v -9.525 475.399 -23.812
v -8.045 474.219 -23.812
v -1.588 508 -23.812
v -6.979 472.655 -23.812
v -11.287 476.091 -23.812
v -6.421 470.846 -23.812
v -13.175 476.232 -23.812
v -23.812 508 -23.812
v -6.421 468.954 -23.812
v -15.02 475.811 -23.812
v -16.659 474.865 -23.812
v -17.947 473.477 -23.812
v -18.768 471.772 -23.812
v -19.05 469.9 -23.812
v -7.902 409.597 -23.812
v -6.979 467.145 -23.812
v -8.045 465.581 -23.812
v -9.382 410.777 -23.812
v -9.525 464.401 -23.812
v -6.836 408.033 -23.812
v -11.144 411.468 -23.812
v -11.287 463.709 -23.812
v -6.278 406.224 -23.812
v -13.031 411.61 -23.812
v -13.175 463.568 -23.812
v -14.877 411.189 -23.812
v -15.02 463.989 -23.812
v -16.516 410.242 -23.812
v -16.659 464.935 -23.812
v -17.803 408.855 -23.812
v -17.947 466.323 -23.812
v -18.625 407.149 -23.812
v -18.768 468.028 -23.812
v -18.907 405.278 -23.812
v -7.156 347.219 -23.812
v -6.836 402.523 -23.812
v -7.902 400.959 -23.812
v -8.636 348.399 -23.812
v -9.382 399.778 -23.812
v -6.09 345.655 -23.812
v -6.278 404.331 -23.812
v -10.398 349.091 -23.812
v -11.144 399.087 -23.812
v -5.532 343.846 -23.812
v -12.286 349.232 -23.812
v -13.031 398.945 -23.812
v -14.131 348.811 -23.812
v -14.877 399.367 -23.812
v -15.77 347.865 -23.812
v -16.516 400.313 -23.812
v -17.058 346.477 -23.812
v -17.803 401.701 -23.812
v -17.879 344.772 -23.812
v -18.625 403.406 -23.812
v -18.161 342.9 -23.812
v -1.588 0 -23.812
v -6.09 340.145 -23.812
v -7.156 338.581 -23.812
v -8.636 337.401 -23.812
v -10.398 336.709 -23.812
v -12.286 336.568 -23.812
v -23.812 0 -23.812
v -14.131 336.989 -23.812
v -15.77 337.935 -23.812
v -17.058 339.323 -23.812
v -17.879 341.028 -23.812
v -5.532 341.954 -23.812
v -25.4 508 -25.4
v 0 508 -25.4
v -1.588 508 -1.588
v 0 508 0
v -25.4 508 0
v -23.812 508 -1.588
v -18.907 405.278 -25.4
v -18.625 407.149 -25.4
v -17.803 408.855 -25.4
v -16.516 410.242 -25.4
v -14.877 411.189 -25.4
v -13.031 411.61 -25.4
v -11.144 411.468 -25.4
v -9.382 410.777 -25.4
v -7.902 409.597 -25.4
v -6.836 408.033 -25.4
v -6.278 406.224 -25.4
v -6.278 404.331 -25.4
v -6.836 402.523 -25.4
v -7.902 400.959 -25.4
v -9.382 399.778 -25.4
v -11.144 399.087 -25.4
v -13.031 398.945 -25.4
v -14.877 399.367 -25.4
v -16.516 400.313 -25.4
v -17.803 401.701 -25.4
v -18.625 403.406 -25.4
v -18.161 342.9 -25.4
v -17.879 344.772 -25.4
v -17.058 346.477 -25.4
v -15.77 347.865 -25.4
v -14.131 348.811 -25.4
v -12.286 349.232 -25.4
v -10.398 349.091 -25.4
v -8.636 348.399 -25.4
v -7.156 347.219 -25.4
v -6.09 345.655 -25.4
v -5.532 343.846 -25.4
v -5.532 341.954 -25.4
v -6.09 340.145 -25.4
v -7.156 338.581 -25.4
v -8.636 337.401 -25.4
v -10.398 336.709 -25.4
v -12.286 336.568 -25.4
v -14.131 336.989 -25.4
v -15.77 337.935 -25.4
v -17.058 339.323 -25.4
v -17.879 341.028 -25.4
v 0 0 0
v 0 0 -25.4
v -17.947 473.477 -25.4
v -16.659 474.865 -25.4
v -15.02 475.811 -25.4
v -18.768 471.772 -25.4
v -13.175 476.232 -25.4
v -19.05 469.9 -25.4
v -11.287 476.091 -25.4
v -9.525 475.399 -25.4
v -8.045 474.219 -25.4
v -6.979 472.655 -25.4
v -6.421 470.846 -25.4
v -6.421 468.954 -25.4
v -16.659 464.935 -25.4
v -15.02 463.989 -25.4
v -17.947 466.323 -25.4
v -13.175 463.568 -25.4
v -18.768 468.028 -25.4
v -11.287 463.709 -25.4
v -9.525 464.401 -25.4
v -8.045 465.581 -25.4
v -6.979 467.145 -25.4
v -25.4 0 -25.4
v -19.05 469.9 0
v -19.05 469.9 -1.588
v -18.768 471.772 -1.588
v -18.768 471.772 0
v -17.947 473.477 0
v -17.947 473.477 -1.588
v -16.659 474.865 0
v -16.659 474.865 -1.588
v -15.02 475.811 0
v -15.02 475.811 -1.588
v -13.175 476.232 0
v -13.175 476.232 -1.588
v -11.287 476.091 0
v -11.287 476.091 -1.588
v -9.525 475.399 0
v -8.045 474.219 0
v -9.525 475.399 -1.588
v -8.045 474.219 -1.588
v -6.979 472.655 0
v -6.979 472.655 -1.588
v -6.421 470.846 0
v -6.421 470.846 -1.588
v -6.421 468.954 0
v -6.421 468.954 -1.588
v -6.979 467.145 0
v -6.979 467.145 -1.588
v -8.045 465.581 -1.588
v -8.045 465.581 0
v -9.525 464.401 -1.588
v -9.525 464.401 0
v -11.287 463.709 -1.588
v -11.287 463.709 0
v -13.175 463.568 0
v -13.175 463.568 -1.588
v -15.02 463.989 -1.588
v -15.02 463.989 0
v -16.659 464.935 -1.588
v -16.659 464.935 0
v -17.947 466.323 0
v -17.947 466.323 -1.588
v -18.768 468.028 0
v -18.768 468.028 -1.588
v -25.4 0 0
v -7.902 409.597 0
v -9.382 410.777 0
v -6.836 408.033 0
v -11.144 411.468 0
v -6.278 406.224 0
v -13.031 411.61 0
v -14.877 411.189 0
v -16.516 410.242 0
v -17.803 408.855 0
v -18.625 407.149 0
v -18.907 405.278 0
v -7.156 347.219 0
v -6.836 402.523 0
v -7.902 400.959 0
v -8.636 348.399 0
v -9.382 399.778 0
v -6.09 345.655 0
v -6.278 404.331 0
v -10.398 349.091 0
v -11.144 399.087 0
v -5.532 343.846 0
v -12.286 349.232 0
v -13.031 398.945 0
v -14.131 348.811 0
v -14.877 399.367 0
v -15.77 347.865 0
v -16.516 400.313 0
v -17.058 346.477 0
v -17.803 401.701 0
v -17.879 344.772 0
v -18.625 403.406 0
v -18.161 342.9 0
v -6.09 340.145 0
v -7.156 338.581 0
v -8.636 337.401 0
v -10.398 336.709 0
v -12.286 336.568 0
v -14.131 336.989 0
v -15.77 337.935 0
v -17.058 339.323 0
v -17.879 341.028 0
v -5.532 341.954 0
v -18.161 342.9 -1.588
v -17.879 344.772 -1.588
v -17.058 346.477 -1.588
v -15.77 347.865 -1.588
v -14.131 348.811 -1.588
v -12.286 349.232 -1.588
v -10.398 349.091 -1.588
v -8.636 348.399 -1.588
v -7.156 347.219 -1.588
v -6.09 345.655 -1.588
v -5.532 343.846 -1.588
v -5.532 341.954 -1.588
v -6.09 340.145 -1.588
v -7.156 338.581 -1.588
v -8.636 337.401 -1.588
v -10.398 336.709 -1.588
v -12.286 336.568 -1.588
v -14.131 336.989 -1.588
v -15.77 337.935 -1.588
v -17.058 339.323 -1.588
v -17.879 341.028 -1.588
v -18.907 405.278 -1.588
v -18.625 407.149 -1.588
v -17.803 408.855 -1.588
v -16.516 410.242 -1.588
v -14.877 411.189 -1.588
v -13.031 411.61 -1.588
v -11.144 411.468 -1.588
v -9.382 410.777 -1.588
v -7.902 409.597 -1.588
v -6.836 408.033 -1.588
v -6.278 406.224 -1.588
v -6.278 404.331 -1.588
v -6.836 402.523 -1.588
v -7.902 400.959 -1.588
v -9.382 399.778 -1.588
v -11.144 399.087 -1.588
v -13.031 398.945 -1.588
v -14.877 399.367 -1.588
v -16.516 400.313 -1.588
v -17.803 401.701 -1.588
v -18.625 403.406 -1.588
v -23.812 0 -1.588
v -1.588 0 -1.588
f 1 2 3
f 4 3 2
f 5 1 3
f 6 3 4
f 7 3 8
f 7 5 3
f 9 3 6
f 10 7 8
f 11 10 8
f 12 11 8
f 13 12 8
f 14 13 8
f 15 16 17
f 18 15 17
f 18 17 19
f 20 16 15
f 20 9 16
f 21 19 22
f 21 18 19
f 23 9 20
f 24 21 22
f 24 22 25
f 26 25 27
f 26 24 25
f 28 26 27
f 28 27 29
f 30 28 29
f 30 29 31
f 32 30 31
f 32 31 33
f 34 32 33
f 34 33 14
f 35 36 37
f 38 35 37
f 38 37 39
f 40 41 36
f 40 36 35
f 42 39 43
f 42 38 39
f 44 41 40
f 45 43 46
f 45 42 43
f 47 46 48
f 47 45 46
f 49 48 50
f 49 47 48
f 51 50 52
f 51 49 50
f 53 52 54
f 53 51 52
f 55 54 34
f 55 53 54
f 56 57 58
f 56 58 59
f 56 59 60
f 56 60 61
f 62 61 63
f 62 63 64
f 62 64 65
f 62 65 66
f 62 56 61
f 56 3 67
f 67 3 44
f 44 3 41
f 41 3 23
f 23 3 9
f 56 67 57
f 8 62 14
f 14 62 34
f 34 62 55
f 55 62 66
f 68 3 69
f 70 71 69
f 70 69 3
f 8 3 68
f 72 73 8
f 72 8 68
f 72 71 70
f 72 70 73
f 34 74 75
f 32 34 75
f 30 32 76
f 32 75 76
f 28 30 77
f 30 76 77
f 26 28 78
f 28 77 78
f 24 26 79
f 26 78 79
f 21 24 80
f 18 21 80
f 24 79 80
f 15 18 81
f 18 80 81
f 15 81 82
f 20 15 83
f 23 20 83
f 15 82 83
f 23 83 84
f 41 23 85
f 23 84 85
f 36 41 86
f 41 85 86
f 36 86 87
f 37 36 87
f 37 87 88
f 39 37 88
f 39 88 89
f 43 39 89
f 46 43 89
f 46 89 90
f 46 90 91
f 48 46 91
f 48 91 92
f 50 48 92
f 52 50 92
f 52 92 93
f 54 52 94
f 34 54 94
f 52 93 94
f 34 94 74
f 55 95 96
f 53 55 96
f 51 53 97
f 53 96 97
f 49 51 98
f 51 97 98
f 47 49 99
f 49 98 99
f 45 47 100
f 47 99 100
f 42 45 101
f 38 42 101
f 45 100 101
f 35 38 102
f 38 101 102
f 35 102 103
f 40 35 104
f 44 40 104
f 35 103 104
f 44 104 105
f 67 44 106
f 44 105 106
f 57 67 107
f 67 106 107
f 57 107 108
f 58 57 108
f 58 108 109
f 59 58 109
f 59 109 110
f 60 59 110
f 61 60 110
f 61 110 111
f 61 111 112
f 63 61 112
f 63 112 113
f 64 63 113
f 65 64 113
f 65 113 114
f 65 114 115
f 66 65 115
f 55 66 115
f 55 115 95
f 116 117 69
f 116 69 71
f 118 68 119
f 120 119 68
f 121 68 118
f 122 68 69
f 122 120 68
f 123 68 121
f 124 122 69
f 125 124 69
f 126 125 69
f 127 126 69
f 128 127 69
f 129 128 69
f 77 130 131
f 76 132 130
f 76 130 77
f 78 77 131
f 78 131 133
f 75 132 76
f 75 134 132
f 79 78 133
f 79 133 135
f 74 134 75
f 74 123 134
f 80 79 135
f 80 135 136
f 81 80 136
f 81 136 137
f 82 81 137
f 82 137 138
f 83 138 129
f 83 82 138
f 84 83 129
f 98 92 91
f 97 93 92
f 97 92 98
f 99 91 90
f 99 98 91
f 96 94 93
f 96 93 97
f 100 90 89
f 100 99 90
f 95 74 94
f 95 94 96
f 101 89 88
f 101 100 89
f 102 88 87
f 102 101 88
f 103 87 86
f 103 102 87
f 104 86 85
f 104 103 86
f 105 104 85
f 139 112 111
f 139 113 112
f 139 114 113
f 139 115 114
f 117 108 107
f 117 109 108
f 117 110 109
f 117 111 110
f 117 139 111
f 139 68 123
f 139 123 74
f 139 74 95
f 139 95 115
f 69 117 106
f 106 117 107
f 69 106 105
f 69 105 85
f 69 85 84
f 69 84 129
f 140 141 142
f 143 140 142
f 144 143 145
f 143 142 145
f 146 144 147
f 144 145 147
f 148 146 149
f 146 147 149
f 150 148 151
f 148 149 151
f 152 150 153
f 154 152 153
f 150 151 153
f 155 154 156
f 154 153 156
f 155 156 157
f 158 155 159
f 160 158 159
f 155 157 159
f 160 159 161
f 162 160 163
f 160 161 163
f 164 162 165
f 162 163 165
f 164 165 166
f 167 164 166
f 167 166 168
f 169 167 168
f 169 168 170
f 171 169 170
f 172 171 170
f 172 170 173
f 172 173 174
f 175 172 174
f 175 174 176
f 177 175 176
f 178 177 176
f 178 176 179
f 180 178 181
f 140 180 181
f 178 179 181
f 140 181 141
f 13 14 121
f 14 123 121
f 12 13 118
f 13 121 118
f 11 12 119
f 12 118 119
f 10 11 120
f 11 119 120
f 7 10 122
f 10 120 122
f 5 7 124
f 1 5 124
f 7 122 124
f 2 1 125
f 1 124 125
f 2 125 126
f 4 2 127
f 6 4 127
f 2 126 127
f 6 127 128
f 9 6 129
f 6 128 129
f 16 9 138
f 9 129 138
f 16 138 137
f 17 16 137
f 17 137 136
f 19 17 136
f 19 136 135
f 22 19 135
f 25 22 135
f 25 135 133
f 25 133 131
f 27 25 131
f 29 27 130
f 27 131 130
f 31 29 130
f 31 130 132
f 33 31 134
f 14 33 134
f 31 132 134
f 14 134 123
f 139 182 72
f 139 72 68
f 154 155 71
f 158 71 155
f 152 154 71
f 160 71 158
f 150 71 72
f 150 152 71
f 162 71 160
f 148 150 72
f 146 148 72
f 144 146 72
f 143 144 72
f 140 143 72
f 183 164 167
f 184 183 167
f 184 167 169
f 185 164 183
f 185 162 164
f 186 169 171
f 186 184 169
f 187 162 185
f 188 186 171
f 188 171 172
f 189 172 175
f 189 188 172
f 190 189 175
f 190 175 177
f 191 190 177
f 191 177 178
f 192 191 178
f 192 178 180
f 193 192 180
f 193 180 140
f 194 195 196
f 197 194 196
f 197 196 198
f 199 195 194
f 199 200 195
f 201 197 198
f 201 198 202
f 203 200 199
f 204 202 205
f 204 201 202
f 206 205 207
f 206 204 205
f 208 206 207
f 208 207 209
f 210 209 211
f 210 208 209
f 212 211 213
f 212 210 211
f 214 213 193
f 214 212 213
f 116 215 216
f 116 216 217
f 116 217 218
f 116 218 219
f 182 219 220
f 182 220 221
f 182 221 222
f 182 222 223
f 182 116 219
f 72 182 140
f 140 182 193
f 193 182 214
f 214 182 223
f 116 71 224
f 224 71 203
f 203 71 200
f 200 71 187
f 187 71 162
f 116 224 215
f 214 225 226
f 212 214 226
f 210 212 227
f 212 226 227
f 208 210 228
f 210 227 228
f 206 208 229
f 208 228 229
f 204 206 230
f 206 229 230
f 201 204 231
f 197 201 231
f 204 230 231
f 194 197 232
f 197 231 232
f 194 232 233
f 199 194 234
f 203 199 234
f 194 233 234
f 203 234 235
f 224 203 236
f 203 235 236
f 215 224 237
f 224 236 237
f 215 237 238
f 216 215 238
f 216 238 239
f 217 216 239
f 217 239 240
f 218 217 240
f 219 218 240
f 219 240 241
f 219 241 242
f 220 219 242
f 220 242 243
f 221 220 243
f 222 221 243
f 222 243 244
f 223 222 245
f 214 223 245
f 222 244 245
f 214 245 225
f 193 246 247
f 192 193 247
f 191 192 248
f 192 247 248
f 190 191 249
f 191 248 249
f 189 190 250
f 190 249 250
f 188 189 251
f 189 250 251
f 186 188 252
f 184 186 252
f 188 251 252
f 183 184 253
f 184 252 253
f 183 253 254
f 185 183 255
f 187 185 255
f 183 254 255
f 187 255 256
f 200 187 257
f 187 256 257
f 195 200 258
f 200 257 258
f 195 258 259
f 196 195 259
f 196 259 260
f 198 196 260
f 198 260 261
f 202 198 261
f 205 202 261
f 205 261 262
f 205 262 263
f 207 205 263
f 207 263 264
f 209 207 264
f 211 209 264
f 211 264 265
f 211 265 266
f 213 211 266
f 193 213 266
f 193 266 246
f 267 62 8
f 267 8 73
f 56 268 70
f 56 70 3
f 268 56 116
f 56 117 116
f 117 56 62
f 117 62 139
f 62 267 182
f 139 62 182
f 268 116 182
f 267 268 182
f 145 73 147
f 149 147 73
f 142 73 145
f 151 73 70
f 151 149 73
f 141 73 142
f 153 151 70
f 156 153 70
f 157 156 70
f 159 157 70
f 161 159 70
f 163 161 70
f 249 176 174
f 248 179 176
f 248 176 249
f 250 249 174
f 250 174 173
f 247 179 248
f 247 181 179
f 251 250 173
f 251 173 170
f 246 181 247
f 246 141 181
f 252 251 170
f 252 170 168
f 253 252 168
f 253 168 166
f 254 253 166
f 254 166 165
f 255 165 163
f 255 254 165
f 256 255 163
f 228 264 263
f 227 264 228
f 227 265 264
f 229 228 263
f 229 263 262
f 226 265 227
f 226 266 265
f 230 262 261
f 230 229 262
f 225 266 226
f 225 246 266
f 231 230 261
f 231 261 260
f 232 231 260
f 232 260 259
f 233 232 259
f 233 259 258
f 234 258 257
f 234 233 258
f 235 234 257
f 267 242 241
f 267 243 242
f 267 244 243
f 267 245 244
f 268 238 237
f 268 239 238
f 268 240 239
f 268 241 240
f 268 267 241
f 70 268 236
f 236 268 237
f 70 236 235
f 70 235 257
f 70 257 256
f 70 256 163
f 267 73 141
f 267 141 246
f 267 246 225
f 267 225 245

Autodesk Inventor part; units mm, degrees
ref_plane "YZ Plane" through (0, 0, 0) normal (1, 0, 0) x (0, 1, 0)
ref_plane "XZ Plane" through (0, 0, 0) normal (0, 1, 0) x (-1, 0, 0)
ref_plane "XY Plane" through (0, 0, 0) normal (0, 0, 1) x (1, 0, 0)
sketch "Sketch1" plane through (0, 0, 0) normal (0, 1, 0) x (-1, 0, 0)
  line L0 (0, 0) -> (25.4, 0)
  line L1 (25.4, 0) -> (25.4, -25.4)
  line L2 (25.4, -25.4) -> (0, -25.4)
  line L3 (0, -25.4) -> (0, 0)
  line L4 (23.8125, -23.8125) -> (23.8125, -1.5875)
  line L5 (23.8125, -1.5875) -> (1.5875, -1.5875)
  line L6 (1.5875, -1.5875) -> (1.5875, -23.8125)
  line L7 (1.5875, -23.8125) -> (23.8125, -23.8125)
  dimension "d0" = 25.4
  dimension "d1" = 25.4
  dimension "d2" = 1.5875
extrude "Extrusion1" add sketch "Sketch1" along normal blind 508
sketch "Sketch2" plane through (0, 0, -25.4) normal (0, 0, -1) x (-1, 0, 0)
  circle A0 centre (12.7, 469.9) radius 6.35
  line L0 (0, 508) -> (25.4, 508) projected
  point P0 (0, 0)
  dimension "d5" = 12.7
  dimension "d6" = 38.1
extrude "Extrusion2" cut sketch "Sketch2" against normal blind 25.4
sketch "Sketch5" plane through (0, 0, -25.4) normal (0, 0, -1) x (-1, 0, 0)
  circle A0 centre (11.811, 342.9) radius 6.35
  line L0 (25.4, 0) -> (25.4, 508) projected
  line L1 (25.4, 0) -> (0, 0) projected
  dimension "d19" = 12.7
  dimension "d20" = 13.589
  dimension "d21" = 342.9
extrude "Extrusion5" cut sketch "Sketch5" against normal blind 25.4
sketch "Sketch6" plane through (0, 0, -25.4) normal (0, 0, -1) x (-1, 0, 0)
  circle A0 centre (12.5567, 405.2777) radius 6.35
  point P0 (0, 0)
  dimension "d24" = 12.7
extrude "Extrusion6" cut sketch "Sketch6" against normal blind 25.4
properties part number "AP 7"
